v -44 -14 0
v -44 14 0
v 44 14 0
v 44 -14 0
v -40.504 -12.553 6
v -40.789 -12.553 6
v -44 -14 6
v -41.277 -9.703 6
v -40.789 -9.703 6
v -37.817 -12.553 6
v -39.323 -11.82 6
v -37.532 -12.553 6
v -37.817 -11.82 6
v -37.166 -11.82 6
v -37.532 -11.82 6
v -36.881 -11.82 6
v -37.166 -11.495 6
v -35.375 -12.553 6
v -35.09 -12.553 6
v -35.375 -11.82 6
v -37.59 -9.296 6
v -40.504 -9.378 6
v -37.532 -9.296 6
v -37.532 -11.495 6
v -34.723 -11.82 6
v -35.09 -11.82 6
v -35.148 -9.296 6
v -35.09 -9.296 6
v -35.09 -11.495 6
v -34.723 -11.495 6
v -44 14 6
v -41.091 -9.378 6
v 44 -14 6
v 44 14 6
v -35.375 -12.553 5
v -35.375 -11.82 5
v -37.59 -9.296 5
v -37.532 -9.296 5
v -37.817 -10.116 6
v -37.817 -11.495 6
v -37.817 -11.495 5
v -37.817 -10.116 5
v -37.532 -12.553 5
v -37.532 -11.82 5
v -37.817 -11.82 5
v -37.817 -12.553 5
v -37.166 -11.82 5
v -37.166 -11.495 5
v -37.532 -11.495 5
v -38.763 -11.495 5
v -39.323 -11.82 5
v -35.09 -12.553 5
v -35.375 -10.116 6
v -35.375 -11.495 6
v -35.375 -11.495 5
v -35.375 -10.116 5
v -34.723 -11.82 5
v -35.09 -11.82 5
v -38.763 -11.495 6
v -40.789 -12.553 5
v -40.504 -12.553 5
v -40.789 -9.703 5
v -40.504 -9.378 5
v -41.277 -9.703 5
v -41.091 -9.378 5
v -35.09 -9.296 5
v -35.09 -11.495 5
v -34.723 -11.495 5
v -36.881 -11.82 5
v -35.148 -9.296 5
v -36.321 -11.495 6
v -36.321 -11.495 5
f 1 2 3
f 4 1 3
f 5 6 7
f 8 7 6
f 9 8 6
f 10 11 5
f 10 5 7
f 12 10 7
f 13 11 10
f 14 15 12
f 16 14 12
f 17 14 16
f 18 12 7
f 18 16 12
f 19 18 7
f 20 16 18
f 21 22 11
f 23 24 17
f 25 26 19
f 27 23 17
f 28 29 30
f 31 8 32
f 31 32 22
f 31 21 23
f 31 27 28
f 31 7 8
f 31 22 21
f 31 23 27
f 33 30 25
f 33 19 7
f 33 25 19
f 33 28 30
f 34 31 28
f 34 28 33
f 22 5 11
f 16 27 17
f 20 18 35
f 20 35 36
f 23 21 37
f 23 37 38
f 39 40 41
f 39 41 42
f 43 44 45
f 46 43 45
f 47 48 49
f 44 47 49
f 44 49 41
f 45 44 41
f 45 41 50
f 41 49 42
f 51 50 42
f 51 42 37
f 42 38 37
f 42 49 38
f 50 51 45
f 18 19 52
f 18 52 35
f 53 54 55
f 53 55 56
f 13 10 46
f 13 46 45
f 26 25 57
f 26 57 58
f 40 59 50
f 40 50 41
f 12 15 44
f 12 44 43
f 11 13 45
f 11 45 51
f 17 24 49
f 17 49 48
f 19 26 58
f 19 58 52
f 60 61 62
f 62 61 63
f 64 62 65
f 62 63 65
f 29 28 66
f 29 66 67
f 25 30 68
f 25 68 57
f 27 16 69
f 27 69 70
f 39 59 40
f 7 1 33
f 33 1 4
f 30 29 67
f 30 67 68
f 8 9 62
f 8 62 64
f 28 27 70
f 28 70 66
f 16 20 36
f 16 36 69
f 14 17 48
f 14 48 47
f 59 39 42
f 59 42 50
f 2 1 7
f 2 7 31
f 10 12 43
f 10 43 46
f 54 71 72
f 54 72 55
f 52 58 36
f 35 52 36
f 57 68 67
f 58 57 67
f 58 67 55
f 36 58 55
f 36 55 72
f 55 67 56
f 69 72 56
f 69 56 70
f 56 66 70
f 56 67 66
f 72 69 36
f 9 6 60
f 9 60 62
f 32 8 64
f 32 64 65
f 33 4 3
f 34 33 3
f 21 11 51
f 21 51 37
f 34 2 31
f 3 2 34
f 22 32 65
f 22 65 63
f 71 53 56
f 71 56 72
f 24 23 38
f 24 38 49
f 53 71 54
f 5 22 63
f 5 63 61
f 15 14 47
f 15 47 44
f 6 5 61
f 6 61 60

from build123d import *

# Parameters (mm, degrees)
SKETCH1_W           = 88
SKETCH1_H           = 28
BOSS_EXTRUDE1_DEPTH = 6
CUT_EXTRUDE1_DEPTH  = 1


with BuildPart() as part:
    # Sketch1 → Boss-Extrude1 (new body)
    with BuildSketch(Plane.XY):
        Rectangle(SKETCH1_W, SKETCH1_H)
    extrude(amount=BOSS_EXTRUDE1_DEPTH)

    # Sketch2 → Cut-Extrude1 (cut)
    # profile 1 of 3: a face of its own
    with BuildSketch(Plane.XY.offset(6)):
        Polygon((-41.090662112, -9.37785215), (-40.503617841, -9.37785215), (-40.503617841, -12.55285215), (-40.788553739, -12.55285215), (-40.788553739, -9.703493175), (-41.277015277, -9.703493175), align=None)
    # profile 2 of 3: a face of its own
    with BuildSketch(Plane.XY.offset(6)):
        Polygon((-37.590021086, -9.296441893), (-37.532143482, -9.296441893), (-37.532143482, -11.494518816), (-37.165797328, -11.494518816), (-37.165797328, -11.820159842), (-37.532143482, -11.820159842), (-37.532143482, -12.55285215), (-37.81707938, -12.55285215), (-37.81707938, -11.820159842), (-39.323169123, -11.820159842), align=None)
        Polygon((-37.81707938, -11.494518816), (-37.81707938, -10.115632598), (-38.76347361, -11.494518816), align=None, mode=Mode.SUBTRACT)
    # profile 3 of 3: a face of its own
    with BuildSketch(Plane.XY.offset(6)):
        Polygon((-35.147713394, -9.296441893), (-35.08983579, -9.296441893), (-35.08983579, -11.494518816), (-34.723489636, -11.494518816), (-34.723489636, -11.820159842), (-35.08983579, -11.820159842), (-35.08983579, -12.55285215), (-35.374771687, -12.55285215), (-35.374771687, -11.820159842), (-36.880861431, -11.820159842), align=None)
        Polygon((-35.374771687, -11.494518816), (-35.374771687, -10.115632598), (-36.321165918, -11.494518816), align=None, mode=Mode.SUBTRACT)
    extrude(amount=-CUT_EXTRUDE1_DEPTH, mode=Mode.SUBTRACT)


solid = part.part
